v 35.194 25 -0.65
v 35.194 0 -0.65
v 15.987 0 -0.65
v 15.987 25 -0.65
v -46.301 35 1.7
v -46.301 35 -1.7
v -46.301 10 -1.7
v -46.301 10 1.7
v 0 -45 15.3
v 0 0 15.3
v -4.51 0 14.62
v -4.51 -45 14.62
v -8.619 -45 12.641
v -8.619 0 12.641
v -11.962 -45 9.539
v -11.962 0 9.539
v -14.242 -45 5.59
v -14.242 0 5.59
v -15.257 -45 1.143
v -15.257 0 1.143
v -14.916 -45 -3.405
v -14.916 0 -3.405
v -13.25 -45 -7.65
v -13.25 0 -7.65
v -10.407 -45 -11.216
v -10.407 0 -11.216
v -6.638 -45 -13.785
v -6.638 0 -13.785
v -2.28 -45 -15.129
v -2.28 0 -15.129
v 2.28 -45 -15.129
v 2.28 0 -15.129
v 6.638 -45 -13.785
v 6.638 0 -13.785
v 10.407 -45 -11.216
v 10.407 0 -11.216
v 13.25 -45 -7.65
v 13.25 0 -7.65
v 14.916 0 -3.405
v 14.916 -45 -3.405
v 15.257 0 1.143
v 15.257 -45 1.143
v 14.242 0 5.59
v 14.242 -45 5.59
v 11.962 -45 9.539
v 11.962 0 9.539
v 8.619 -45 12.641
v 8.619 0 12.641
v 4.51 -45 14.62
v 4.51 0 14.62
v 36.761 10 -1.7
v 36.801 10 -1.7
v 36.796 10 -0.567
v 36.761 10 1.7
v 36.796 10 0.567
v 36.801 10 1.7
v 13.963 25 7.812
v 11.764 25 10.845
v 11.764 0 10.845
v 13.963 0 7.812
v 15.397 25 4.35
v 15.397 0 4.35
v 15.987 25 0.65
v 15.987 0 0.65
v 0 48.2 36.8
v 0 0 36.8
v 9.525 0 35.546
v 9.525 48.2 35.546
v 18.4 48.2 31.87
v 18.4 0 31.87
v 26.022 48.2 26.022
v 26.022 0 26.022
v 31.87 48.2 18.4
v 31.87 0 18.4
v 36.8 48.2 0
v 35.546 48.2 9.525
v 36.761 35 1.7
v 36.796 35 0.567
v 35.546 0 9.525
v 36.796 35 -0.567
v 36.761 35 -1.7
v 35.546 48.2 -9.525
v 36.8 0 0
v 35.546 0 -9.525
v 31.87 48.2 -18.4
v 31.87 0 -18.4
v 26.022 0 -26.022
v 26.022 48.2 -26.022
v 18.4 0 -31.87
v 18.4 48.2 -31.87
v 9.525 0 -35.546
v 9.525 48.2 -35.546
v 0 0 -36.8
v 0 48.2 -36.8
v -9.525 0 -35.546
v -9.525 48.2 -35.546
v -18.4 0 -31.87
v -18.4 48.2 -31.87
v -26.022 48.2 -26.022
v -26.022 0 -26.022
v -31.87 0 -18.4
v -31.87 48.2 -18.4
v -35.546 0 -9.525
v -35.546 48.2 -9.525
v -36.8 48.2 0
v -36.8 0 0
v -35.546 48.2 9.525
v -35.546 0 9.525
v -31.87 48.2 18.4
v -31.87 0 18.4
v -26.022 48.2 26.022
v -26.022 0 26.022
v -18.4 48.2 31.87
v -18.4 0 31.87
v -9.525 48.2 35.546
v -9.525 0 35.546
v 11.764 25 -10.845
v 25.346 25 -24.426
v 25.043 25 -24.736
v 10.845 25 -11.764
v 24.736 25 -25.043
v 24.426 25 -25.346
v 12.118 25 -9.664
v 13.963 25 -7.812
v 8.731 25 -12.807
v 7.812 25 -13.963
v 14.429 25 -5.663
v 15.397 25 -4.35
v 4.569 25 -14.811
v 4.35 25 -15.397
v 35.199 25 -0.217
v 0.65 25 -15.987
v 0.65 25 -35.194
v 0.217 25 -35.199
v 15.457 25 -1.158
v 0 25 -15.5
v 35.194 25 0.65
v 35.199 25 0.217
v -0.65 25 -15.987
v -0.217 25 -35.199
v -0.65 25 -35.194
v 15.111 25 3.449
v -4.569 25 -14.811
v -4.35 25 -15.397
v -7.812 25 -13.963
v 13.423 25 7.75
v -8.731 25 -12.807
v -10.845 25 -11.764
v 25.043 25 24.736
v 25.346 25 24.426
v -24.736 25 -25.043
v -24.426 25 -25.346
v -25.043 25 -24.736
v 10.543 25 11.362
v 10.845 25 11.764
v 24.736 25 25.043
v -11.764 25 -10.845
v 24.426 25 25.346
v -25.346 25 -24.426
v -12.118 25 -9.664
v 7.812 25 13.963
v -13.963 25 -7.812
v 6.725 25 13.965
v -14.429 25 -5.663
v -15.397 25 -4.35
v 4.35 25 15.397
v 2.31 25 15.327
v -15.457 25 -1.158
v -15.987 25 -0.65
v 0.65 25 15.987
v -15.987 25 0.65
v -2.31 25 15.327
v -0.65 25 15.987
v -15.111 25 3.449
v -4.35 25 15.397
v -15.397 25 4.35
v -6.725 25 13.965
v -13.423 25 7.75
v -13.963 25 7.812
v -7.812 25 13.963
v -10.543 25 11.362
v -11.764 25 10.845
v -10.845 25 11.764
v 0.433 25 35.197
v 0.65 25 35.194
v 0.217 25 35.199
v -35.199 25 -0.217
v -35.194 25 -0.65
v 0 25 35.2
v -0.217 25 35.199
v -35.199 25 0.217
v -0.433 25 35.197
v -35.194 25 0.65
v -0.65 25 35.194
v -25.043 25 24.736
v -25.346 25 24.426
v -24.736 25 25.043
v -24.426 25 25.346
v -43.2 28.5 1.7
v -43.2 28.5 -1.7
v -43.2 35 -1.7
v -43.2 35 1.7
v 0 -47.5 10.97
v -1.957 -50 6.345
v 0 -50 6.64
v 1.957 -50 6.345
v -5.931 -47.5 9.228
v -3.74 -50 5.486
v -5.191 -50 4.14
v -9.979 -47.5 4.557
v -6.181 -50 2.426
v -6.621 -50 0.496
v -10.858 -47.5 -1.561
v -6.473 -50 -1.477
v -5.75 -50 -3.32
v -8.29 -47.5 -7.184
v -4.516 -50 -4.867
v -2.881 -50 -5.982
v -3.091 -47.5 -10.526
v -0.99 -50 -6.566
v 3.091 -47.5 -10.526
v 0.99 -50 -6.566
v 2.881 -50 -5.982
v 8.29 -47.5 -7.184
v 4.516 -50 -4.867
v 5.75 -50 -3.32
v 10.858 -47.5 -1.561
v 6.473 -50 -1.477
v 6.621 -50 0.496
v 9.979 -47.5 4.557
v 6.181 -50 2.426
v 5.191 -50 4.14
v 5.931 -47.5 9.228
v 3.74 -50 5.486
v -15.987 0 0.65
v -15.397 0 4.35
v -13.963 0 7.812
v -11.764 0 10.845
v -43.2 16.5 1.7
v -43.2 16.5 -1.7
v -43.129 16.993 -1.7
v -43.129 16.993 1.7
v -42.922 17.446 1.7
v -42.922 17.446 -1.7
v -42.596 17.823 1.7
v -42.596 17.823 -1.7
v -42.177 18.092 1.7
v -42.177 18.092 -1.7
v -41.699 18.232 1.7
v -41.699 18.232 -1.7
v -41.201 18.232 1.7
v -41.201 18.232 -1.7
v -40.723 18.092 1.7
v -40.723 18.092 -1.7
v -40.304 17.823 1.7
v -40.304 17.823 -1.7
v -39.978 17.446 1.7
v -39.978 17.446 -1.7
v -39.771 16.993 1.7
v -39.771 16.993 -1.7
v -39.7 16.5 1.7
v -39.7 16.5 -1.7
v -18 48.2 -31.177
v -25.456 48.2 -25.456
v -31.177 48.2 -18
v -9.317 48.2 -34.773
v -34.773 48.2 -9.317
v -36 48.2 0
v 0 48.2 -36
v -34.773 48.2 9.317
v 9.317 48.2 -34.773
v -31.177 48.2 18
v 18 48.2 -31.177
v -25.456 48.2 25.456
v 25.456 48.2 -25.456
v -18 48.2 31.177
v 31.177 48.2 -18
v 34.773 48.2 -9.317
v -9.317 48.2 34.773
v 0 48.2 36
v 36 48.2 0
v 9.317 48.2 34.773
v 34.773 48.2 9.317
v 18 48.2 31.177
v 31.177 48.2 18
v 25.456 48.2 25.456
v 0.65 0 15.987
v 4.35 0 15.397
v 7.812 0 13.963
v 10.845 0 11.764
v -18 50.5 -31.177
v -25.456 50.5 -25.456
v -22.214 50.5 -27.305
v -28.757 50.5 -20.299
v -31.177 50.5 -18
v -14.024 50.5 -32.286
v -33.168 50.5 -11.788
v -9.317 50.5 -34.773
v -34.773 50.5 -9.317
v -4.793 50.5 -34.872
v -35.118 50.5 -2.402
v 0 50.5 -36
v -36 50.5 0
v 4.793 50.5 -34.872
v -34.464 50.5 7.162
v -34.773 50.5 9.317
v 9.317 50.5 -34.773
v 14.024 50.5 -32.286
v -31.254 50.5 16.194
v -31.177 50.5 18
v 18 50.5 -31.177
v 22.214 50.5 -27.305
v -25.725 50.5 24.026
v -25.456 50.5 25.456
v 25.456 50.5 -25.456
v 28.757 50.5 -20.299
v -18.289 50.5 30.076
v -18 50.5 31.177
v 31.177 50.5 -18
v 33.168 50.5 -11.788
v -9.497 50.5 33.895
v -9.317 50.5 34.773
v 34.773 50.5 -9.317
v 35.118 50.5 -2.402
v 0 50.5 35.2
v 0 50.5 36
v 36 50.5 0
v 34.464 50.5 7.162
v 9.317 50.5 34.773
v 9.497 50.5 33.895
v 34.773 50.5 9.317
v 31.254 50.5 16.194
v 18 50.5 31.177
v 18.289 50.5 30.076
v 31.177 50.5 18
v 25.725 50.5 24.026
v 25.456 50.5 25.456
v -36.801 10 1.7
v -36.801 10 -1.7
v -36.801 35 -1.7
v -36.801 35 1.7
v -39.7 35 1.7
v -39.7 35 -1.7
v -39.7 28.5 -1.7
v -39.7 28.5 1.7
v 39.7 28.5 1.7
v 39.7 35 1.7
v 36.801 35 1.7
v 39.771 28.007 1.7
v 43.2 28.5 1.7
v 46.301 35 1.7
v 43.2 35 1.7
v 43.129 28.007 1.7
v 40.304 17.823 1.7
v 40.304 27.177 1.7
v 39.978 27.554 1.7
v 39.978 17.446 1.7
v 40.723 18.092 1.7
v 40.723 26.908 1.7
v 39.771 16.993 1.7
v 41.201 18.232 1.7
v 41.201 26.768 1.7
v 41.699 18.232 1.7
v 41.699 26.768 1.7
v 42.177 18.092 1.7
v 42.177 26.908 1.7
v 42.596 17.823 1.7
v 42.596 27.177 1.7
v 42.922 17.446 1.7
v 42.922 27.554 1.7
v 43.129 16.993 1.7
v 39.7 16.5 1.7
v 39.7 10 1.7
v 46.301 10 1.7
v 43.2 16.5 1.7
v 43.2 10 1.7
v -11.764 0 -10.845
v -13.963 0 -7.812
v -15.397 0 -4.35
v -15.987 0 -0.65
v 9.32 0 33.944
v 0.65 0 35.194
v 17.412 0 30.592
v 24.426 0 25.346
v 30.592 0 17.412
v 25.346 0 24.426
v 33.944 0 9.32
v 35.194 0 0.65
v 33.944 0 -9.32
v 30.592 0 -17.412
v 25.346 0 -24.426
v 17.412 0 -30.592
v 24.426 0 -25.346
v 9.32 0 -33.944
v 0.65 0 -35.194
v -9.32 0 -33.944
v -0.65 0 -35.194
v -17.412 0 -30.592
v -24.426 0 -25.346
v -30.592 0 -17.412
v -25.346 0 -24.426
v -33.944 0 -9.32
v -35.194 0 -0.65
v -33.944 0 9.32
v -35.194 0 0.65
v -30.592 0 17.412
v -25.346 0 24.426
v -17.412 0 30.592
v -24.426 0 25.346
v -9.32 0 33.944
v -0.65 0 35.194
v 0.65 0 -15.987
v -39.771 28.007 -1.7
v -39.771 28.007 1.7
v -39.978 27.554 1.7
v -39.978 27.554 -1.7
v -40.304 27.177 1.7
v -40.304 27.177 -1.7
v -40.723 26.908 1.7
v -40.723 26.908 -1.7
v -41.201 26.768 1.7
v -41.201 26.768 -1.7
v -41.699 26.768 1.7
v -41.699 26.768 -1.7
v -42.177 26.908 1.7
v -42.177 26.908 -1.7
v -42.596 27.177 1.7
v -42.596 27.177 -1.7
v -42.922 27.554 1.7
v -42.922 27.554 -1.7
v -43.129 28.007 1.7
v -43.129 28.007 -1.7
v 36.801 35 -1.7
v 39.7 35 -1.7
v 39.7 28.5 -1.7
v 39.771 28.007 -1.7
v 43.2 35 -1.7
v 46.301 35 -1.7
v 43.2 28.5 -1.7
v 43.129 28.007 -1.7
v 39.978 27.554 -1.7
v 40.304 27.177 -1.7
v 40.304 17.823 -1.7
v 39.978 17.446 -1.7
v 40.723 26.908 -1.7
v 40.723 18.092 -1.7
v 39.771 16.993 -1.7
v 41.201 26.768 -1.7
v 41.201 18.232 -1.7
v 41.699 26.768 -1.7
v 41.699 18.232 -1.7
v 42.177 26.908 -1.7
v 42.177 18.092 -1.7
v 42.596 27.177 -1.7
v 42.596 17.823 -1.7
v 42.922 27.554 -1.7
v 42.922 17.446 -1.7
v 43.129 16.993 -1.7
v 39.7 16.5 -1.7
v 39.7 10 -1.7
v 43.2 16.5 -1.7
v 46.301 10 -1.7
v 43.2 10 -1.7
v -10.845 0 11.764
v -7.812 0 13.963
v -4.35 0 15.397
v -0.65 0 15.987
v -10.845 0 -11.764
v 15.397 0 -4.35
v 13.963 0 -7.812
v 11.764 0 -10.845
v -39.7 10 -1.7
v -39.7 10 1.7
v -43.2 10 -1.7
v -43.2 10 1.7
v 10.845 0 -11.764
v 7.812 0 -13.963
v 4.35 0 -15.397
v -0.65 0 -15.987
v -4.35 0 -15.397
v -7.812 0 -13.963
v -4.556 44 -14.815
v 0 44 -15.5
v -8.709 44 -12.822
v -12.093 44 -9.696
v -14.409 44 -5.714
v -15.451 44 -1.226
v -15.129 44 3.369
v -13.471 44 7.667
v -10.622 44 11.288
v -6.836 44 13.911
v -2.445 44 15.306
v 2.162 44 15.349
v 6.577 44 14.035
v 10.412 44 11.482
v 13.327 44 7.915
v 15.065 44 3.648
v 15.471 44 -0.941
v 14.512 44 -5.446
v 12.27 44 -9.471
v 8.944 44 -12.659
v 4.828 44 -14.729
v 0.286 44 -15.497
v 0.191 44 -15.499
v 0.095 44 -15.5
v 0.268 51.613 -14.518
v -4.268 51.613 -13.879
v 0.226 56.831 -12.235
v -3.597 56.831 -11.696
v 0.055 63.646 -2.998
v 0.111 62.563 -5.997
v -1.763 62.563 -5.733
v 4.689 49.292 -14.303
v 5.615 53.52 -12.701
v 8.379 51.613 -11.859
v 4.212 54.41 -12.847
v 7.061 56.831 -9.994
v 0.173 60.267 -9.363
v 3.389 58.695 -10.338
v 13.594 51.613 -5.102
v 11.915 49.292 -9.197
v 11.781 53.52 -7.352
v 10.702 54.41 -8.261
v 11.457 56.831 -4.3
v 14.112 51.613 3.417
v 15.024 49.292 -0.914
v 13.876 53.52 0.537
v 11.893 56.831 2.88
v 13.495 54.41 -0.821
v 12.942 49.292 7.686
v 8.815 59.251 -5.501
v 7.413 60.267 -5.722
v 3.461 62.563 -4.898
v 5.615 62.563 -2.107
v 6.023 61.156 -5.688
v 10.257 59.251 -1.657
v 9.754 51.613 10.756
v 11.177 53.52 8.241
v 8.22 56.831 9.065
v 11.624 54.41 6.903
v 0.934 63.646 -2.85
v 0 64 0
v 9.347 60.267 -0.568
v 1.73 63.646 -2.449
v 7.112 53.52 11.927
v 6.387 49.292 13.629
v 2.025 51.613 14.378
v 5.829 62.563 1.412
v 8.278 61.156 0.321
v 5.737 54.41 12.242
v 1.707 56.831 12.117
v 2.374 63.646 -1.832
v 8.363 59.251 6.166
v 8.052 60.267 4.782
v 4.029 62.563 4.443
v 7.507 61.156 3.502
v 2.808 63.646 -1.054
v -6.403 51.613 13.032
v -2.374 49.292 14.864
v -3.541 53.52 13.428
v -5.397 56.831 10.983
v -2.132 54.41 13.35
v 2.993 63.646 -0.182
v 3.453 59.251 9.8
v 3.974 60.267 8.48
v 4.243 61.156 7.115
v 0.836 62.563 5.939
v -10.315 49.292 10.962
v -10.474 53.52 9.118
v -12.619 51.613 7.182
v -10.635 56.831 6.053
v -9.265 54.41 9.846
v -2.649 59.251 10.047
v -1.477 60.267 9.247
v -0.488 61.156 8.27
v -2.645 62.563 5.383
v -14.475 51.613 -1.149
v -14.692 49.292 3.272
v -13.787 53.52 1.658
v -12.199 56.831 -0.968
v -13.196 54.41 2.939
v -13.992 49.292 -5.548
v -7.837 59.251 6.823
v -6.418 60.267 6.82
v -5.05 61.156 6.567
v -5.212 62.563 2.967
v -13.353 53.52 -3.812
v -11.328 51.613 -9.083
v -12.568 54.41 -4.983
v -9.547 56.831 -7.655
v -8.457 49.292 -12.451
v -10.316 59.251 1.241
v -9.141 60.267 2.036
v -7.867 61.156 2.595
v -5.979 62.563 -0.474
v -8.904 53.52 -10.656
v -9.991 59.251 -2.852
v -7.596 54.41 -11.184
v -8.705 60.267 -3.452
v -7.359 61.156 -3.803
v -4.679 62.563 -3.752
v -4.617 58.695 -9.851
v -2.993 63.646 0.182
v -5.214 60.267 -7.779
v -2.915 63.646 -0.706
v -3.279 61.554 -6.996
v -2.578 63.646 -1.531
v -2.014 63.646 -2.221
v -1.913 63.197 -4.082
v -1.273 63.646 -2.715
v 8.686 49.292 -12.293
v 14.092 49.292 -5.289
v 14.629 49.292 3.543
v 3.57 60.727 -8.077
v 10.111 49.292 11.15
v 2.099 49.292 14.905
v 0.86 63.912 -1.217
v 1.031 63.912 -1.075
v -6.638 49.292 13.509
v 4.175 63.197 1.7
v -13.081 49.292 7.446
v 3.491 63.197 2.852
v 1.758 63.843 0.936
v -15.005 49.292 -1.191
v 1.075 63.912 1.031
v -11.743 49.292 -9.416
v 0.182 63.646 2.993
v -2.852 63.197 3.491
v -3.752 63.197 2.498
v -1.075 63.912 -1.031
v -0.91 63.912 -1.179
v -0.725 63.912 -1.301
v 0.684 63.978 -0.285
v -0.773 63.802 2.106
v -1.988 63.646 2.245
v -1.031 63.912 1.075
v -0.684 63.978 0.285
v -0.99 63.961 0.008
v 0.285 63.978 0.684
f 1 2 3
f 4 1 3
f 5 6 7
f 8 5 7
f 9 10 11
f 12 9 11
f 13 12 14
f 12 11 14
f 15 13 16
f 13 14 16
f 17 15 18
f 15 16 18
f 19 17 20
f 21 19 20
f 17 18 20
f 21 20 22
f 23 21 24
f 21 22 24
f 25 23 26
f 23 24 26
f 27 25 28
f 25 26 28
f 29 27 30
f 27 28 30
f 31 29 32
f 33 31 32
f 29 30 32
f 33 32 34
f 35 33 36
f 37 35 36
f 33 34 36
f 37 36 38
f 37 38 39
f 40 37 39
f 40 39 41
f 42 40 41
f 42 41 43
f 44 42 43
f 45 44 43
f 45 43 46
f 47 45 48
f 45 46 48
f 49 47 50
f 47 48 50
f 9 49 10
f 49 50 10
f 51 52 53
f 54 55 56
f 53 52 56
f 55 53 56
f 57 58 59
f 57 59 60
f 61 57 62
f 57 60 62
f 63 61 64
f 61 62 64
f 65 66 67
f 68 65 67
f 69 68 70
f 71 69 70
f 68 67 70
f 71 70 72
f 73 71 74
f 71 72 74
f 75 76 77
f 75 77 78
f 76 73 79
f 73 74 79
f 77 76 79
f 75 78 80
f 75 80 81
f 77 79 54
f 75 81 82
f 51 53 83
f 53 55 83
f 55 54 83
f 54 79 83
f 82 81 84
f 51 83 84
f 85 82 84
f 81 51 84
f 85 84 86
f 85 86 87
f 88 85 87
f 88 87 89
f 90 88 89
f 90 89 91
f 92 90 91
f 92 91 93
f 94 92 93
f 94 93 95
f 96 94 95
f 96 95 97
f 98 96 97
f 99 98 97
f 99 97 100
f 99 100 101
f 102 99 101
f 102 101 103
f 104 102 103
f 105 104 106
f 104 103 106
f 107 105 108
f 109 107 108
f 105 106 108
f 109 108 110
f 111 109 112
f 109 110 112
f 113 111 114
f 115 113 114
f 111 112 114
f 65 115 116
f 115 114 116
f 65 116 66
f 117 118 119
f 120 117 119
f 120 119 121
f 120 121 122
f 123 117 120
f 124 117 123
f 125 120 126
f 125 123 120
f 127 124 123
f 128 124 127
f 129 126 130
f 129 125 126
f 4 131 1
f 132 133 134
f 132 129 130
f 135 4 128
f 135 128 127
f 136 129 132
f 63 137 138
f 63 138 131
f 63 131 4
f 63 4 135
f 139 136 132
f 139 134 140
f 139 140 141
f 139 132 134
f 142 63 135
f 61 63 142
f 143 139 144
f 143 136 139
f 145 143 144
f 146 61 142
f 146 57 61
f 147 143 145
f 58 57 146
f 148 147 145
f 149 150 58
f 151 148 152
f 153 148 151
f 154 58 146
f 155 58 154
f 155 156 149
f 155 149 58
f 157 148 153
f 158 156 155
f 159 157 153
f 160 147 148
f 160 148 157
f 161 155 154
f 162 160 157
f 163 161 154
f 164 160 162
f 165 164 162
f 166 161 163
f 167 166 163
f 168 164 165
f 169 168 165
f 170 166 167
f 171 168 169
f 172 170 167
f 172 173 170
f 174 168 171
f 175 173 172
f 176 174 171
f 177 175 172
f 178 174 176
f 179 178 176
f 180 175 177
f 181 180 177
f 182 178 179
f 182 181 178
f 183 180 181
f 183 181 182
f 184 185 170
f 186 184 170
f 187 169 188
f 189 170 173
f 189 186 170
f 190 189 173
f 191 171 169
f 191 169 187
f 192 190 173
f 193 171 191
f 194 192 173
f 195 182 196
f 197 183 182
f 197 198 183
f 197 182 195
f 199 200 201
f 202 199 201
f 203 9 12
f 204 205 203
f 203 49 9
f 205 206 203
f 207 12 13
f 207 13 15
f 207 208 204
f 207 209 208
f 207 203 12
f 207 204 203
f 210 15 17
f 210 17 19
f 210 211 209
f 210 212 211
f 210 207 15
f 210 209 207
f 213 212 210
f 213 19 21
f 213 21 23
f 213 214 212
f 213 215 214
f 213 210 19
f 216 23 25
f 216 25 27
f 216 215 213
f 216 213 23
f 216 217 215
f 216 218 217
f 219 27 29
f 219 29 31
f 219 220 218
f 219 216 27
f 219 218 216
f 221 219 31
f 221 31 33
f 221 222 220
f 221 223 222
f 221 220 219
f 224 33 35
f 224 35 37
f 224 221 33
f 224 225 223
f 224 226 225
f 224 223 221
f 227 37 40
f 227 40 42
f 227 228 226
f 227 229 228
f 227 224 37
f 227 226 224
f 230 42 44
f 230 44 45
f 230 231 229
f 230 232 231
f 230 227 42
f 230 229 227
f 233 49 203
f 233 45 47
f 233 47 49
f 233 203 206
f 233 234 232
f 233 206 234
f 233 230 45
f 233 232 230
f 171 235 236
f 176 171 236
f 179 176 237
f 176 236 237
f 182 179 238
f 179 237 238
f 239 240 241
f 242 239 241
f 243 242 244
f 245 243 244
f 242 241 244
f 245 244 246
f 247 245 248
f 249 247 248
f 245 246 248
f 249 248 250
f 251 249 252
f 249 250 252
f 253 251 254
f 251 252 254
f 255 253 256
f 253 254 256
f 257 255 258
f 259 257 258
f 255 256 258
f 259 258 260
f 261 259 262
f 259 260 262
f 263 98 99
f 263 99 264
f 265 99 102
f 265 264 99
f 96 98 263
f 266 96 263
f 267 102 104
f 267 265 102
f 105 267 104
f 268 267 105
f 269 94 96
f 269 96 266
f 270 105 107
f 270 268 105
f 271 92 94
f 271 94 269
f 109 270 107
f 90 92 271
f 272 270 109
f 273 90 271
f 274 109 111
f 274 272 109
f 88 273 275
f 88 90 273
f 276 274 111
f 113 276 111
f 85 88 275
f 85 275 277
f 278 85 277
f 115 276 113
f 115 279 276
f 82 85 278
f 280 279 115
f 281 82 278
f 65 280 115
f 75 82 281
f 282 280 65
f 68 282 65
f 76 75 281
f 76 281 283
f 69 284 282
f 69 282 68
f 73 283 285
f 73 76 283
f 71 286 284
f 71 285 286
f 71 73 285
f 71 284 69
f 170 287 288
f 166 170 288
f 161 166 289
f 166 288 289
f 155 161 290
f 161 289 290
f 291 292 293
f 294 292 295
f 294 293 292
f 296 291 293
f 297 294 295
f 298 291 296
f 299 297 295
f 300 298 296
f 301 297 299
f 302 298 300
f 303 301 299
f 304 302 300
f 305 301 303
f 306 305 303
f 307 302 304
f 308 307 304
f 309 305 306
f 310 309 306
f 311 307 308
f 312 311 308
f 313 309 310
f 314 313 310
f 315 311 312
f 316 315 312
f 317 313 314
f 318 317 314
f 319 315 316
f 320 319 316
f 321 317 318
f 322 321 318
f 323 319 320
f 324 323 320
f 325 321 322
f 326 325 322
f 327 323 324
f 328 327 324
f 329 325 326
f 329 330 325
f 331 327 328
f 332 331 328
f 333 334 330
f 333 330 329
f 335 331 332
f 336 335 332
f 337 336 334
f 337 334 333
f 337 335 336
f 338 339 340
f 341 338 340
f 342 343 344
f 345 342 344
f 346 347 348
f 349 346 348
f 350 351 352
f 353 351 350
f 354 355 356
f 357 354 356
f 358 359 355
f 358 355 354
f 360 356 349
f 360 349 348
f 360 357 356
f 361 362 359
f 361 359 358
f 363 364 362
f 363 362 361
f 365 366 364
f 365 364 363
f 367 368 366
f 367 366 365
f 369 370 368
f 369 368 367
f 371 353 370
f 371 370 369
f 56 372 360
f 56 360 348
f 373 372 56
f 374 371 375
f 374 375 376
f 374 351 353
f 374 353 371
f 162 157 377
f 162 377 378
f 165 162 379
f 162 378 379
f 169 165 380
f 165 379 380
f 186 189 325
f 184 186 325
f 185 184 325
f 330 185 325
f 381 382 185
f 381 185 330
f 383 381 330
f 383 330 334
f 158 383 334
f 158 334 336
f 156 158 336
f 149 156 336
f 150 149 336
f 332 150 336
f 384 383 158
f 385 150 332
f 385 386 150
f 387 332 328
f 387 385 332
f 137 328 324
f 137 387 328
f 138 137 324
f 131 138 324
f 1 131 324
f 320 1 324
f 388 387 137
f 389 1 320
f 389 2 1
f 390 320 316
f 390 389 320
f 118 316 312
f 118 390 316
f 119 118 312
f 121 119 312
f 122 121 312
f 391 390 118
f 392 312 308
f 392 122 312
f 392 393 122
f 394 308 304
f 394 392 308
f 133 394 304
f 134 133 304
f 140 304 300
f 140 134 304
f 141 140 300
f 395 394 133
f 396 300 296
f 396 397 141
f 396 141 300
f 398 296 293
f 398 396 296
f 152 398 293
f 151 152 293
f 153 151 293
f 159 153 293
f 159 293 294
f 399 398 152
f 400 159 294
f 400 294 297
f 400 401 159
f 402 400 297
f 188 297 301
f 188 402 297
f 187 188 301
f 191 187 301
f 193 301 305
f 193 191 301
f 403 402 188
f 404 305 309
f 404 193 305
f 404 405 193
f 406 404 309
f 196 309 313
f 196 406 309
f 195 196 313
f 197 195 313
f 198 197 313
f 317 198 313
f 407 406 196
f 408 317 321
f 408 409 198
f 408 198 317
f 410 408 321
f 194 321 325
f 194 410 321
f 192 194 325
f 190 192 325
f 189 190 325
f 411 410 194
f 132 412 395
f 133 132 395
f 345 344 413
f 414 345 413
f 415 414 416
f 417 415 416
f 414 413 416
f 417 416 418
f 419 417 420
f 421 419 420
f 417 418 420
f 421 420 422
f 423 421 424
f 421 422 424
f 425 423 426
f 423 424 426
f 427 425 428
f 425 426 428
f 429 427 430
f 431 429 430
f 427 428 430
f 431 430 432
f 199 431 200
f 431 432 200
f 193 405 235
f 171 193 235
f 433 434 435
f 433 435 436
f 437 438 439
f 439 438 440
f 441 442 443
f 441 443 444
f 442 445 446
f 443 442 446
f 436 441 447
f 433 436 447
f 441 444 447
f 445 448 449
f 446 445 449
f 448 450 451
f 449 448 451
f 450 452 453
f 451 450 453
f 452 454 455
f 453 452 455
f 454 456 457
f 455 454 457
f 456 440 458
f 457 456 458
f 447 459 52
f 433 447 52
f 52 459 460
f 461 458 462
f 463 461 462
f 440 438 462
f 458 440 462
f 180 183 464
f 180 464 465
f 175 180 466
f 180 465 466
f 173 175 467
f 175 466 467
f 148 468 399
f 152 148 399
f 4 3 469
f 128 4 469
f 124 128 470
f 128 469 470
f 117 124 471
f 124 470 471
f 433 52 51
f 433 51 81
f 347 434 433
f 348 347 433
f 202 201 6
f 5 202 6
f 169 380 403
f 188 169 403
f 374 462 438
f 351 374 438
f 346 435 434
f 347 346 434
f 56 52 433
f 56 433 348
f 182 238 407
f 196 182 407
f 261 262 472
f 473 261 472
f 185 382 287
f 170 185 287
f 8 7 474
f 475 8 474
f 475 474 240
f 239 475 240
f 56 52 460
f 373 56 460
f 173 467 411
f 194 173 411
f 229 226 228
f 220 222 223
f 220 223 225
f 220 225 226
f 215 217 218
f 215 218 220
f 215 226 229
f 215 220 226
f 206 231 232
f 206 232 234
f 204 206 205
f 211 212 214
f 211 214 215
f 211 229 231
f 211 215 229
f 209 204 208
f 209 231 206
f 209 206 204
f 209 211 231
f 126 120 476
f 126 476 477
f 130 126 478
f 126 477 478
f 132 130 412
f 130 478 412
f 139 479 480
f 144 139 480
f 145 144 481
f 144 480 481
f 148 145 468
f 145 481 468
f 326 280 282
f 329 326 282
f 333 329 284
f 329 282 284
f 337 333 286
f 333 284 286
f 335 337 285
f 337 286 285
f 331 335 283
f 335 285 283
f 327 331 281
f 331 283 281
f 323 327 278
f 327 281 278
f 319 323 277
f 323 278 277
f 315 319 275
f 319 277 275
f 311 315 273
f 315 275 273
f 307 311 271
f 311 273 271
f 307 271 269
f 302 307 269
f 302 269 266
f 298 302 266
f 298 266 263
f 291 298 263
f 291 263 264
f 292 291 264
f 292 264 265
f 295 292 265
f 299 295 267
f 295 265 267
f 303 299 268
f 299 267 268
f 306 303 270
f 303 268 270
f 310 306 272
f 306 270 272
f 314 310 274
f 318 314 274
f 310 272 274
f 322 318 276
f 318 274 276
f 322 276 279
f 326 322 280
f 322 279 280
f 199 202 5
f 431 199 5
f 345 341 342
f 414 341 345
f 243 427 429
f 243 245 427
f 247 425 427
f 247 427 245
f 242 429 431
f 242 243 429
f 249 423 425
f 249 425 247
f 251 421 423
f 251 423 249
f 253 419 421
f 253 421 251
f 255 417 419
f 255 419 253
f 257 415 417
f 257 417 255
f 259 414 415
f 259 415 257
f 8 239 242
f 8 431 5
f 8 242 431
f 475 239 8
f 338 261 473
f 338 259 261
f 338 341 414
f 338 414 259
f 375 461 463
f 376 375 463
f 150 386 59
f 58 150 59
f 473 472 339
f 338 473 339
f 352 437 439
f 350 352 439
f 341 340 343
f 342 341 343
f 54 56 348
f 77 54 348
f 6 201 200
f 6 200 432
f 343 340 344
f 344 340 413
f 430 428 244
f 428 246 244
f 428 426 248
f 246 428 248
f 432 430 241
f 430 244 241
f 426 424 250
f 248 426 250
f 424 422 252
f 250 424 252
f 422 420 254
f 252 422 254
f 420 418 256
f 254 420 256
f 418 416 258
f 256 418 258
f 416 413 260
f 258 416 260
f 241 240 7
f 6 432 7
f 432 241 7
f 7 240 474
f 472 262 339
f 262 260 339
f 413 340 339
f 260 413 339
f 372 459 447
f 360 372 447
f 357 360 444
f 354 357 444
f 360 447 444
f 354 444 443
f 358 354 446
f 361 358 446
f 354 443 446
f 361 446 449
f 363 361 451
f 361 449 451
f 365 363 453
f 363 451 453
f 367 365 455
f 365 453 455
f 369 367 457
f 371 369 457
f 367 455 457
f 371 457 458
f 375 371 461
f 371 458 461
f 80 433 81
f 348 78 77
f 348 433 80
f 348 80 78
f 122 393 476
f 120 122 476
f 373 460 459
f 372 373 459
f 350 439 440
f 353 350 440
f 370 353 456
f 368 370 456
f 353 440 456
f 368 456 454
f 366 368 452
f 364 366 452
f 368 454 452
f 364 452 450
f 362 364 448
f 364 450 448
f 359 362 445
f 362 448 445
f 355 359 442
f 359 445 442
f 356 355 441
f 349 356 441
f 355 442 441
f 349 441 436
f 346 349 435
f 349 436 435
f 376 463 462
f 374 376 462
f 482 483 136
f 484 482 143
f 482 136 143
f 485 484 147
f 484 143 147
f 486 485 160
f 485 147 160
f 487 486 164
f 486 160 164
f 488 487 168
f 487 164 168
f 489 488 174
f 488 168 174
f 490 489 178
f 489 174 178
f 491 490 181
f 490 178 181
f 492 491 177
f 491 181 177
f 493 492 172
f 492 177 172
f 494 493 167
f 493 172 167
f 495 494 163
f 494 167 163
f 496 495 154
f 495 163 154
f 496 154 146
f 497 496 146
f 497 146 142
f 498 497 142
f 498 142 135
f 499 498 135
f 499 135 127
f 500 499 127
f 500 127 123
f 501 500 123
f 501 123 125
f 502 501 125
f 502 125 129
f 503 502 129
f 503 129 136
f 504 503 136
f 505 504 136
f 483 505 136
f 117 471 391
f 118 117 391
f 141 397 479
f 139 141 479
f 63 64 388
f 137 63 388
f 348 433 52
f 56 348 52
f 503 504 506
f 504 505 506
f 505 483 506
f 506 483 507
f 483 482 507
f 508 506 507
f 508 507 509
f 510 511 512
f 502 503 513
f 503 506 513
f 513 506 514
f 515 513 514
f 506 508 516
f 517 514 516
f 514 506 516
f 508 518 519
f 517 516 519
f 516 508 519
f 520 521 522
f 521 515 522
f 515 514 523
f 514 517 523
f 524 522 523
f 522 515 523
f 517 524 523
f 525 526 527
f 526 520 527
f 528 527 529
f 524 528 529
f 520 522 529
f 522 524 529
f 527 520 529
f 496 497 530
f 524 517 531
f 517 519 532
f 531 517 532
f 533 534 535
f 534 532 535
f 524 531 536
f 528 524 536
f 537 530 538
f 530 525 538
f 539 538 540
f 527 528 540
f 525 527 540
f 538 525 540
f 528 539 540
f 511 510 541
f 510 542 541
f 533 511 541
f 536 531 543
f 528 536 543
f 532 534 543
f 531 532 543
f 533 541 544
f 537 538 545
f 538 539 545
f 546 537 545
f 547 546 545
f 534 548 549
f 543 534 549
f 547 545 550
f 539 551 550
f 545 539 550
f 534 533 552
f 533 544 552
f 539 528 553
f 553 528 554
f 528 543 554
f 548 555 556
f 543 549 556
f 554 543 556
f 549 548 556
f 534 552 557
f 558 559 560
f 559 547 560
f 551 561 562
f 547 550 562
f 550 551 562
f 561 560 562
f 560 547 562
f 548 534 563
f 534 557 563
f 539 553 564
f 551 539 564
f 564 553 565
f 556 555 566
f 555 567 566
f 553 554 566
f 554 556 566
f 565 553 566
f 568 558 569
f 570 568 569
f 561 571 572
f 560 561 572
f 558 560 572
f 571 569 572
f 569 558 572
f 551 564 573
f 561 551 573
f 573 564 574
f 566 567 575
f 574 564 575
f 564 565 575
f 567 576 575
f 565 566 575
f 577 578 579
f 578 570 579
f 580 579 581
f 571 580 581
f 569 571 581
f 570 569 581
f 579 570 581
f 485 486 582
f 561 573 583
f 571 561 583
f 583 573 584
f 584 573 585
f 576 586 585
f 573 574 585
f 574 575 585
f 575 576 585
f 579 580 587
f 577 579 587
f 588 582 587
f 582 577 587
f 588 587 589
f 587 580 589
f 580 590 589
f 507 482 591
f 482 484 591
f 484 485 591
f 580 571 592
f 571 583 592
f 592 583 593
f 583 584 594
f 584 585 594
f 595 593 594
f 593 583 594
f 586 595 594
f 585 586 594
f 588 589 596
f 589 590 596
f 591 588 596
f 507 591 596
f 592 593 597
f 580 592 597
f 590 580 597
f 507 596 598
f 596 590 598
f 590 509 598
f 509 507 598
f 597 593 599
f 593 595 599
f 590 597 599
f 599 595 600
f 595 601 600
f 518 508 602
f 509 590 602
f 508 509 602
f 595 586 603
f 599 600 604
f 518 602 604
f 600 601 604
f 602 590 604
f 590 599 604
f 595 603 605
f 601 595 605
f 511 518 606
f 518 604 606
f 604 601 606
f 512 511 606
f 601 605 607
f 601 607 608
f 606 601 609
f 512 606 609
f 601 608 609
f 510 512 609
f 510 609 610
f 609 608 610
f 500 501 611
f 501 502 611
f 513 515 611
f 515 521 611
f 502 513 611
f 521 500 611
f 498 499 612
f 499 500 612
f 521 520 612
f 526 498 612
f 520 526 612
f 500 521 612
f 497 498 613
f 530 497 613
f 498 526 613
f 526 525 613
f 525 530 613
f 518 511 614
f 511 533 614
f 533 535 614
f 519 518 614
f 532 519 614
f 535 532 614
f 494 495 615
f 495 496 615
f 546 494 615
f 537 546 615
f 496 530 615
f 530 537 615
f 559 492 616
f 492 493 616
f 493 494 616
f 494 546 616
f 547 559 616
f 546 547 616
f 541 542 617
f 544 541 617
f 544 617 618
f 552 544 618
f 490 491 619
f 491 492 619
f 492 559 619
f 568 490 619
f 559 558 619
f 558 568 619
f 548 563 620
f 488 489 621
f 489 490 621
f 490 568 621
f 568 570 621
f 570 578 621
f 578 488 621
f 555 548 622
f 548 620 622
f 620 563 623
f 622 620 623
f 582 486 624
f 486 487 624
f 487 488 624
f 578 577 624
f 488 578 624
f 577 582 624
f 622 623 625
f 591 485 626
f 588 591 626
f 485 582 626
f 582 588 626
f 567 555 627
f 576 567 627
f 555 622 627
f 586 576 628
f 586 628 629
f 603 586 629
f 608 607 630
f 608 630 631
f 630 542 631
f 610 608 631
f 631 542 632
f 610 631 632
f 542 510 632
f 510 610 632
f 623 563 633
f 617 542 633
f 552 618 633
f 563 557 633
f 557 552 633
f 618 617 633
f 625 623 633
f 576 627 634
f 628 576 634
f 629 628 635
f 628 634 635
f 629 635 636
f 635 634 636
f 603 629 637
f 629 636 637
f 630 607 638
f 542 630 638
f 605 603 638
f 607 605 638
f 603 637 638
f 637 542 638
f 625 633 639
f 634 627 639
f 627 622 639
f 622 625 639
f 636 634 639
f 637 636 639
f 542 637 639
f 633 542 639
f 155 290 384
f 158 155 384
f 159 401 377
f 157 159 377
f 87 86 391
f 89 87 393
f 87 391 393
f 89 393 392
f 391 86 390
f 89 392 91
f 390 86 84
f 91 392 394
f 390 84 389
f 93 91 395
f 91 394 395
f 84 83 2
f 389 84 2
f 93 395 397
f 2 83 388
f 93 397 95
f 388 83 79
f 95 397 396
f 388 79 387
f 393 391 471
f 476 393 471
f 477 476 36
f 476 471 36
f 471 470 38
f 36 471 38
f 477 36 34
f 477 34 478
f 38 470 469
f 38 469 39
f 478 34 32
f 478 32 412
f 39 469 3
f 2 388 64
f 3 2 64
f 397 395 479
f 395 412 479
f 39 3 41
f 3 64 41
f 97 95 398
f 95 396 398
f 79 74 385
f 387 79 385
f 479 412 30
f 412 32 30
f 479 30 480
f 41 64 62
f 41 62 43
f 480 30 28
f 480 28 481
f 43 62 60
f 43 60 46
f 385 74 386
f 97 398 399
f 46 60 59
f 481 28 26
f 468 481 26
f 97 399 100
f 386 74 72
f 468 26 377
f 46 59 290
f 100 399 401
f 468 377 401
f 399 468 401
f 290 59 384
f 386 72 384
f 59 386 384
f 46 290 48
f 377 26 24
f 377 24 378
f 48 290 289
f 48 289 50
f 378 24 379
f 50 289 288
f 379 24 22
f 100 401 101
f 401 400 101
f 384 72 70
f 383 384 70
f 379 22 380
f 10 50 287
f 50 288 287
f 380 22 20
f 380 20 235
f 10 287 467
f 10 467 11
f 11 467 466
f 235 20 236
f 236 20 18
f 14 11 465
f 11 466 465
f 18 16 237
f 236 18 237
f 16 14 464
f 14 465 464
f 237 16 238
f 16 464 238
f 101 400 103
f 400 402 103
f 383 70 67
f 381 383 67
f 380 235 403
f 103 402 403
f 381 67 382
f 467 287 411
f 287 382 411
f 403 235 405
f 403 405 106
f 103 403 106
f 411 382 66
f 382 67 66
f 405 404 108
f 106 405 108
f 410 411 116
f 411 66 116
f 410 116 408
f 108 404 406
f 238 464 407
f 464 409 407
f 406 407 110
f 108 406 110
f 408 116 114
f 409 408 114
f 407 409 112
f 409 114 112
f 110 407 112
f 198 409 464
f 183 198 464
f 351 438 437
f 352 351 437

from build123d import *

# Parameters (mm, degrees)
SKETCH1_R                  = 36.8
SKETCH1_R_2                = 35.2
BOSS_EXTRUDE1_DEPTH        = 50.5
SKETCH2_R                  = 15
BOSS_EXTRUDE2_DEPTH        = 25
BOSS_EXTRUDE3_DEPTH        = 1.7
BOSS_EXTRUDE3_DEPTH_BACK   = 1.7
BOSS_EXTRUDE3_2_DEPTH      = 1.7
BOSS_EXTRUDE3_2_DEPTH_BACK = 1.7
BOSS_EXTRUDE4_REACH        = 105.973
BOSS_EXTRUDE4_END_RADIUS   = 36.8
SKETCH4_W                  = 3.4
SKETCH4_H                  = 25
CUT_EXTRUDE1_START         = -2.3
SKETCH5_R                  = 36.8
SKETCH5_R_2                = 36
CUT_EXTRUDE1_DEPTH         = 2.3
SKETCH6_R                  = 15.3
BOSS_EXTRUDE5_DEPTH        = 50
CHAMFER1_SIZE              = 5
CHAMFER1_SIZE2             = 8.660254038
SKETCH7_R                  = 15.5
BOSS_EXTRUDE6_DEPTH        = 44


with BuildPart() as part:
    # Sketch1 → Boss-Extrude1 (new body)
    with BuildSketch(Plane(origin=(0, 0, 0), x_dir=(1, 0, 0), z_dir=(0, 1, 0))):
        with Locations(Location((0, 0, 0), (0, 0, 270))):
            Circle(SKETCH1_R)
        with Locations(Location((0, 0, 0), (0, 0, 270))):
            Circle(SKETCH1_R_2, mode=Mode.SUBTRACT)
    extrude(amount=BOSS_EXTRUDE1_DEPTH)

    # Sketch2 → Boss-Extrude2 (add)
    with BuildSketch(Plane.XZ):
        with BuildLine():
            Line((15.986791423, 0.65), (35.193998068, 0.65))
            ThreePointArc((35.193998068, 0.65), (35.2, 0), (35.193998068, -0.65))
            Line((35.193998068, -0.65), (15.986791423, -0.65))
            ThreePointArc((15.986791423, -0.65), (14.78207252, -6.122934918), (11.763988032, -10.844749217))
            Line((11.763988032, -10.844749217), (25.345534099, -24.426295283))
            ThreePointArc((25.345534099, -24.426295283), (24.890158698, -24.890158698), (24.426295283, -25.345534099))
            Line((24.426295283, -25.345534099), (10.844749217, -11.763988032))
            ThreePointArc((10.844749217, -11.763988032), (6.122934918, -14.78207252), (0.65, -15.986791423))
            Line((0.65, -15.986791423), (0.65, -35.193998068))
            ThreePointArc((0.65, -35.193998068), (0, -35.2), (-0.65, -35.193998068))
            Line((-0.65, -35.193998068), (-0.65, -15.986791423))
            ThreePointArc((-0.65, -15.986791423), (-6.122934918, -14.78207252), (-10.844749217, -11.763988032))
            Line((-10.844749217, -11.763988032), (-24.426295283, -25.345534099))
            ThreePointArc((-24.426295283, -25.345534099), (-24.890158698, -24.890158698), (-25.345534099, -24.426295283))
            Line((-25.345534099, -24.426295283), (-11.763988032, -10.844749217))
            ThreePointArc((-11.763988032, -10.844749217), (-14.78207252, -6.122934918), (-15.986791423, -0.65))
            Line((-15.986791423, -0.65), (-35.193998068, -0.65))
            ThreePointArc((-35.193998068, -0.65), (-35.2, 0), (-35.193998068, 0.65))
            Line((-35.193998068, 0.65), (-15.986791423, 0.65))
            ThreePointArc((-15.986791423, 0.65), (-14.78207252, 6.122934918), (-11.763988032, 10.844749217))
            Line((-11.763988032, 10.844749217), (-25.345534099, 24.426295283))
            ThreePointArc((-25.345534099, 24.426295283), (-24.890158698, 24.890158698), (-24.426295283, 25.345534099))
            Line((-24.426295283, 25.345534099), (-10.844749217, 11.763988032))
            ThreePointArc((-10.844749217, 11.763988032), (-6.122934918, 14.78207252), (-0.65, 15.986791423))
            Line((-0.65, 15.986791423), (-0.65, 35.193998068))
            ThreePointArc((-0.65, 35.193998068), (0, 35.2), (0.65, 35.193998068))
            Line((0.65, 35.193998068), (0.65, 15.986791423))
            ThreePointArc((0.65, 15.986791423), (6.122934918, 14.78207252), (10.844749217, 11.763988032))
            Line((10.844749217, 11.763988032), (24.426295283, 25.345534099))
            ThreePointArc((24.426295283, 25.345534099), (24.890158698, 24.890158698), (25.345534099, 24.426295283))
            Line((25.345534099, 24.426295283), (11.763988032, 10.844749217))
            ThreePointArc((11.763988032, 10.844749217), (14.78207252, 6.122934918), (15.986791423, 0.65))
        make_face()
        with Locations(Location((0, 0, 0), (0, 0, 270))):
            Circle(SKETCH2_R, mode=Mode.SUBTRACT)
    extrude(amount=-BOSS_EXTRUDE2_DEPTH)

    # Boss-Extrude4: up to this cylinder (the profile starts outside it)
    boss_extrude4_end = Plane(origin=(0, 22.5, 0), z_dir=(0, -1, 0)) * Cylinder(BOSS_EXTRUDE4_END_RADIUS, 286.546, mode=Mode.PRIVATE)
    # Sketch4 → Boss-Extrude4 (add, up to the surface)
    with BuildSketch(Plane.ZY.offset(-36.800796618), mode=Mode.PRIVATE) as boss_extrude4_sk1:
        with Locations((0, 22.5)):
            Rectangle(SKETCH4_W, SKETCH4_H)
    boss_extrude4_tool1 = extrude(boss_extrude4_sk1.sketch, amount=BOSS_EXTRUDE4_REACH, mode=Mode.PRIVATE) - boss_extrude4_end
    add(boss_extrude4_tool1.solids().sort_by_distance((36.800797, 22.5, 0))[0])

    # Sketch5 → Cut-Extrude1 (cut)
    with BuildSketch(Plane(origin=(0, 50.5, 0), x_dir=(1, 0, 0), z_dir=(0, 1, 0)).offset(CUT_EXTRUDE1_START)):
        with Locations(Location((0, 0, 0), (0, 0, 270))):
            Circle(SKETCH5_R)
        with Locations(Location((0, 0, 0), (0, 0, 270))):
            Circle(SKETCH5_R_2, mode=Mode.SUBTRACT)
    extrude(amount=CUT_EXTRUDE1_DEPTH, mode=Mode.SUBTRACT)

    # Sketch6 → Boss-Extrude5 (add)
    with BuildSketch(Plane.XZ):
        with Locations(Location((0, 0, 0), (0, 0, 90))):
            Circle(SKETCH6_R)
    extrude(amount=BOSS_EXTRUDE5_DEPTH)

    # Chamfer1
    chamfer1_edges = [part.edges().sort_by_distance(p)[0] for p in [
        (0, -50, -15.3),
    ]]
    chamfer1_side = [part.faces().sort_by_distance(p)[0] for p in [
        (0, -25, -15.3),
    ]]
    chamfer(chamfer1_edges, length=CHAMFER1_SIZE, length2=CHAMFER1_SIZE2, reference=chamfer1_side[0])

    # Sketch7 → Boss-Extrude6 (add)
    with BuildSketch(Plane(origin=(0, 0, 0), x_dir=(1, 0, 0), z_dir=(0, 1, 0))):
        with Locations(Location((0, 0, 0), (0, 0, 90))):
            Circle(SKETCH7_R)
    extrude(amount=BOSS_EXTRUDE6_DEPTH)

    # Sketch8 → Revolve2 (revolve)
    with BuildSketch(Plane(origin=(0, 0, 0), x_dir=(0, -1, 0), z_dir=(0, 0, 1)), mode=Mode.PRIVATE) as revolve2_sk:
        with BuildLine():
            Line((-44, 15.5), (-44, 0))
            Line((-44, 0), (-64, 0))
            add(Edge.make_bspline(
                [(-44, 15.5), (-57.970648209, 15.5), (-64, 7.069745011), (-64, 0)],
                knots=[0, 0, 0, 0, 1, 1, 1, 1], degree=3))
        make_face()
    revolve(revolve2_sk.sketch.rotate(Axis((0, 25, 0), (0, -1, 0)), 271.058078794), axis=Axis((0, 25, 0), (0, -1, 0)))


with BuildPart() as body_2:
    # Sketch3 → Boss-Extrude3 (new, two sides: drawn at the far end of the back side and taken through both)
    with BuildSketch(Plane(origin=(0, 0, 0), x_dir=(0, -1, 0), z_dir=(0, 0, 1)).offset(-BOSS_EXTRUDE3_DEPTH_BACK)):
        with BuildLine():
            Line((-35, 36.800796618), (-10, 36.800796618))
            Line((-10, 36.800796618), (-10, 39.7))
            Line((-10, 39.7), (-16.5, 39.7))
            ThreePointArc((-16.5, 39.7), (-18.25, 41.45), (-16.5, 43.2))
            Line((-16.5, 43.2), (-10, 43.2))
            Line((-10, 43.2), (-10, 46.300796618))
            Line((-10, 46.300796618), (-35, 46.300796618))
            Line((-35, 46.300796618), (-35, 43.2))
            Line((-35, 43.2), (-28.5, 43.2))
            ThreePointArc((-28.5, 43.2), (-26.75, 41.45), (-28.5, 39.7))
            Line((-28.5, 39.7), (-35, 39.7))
            Line((-35, 39.7), (-35, 36.800796618))
        make_face()
    extrude(amount=BOSS_EXTRUDE3_DEPTH + BOSS_EXTRUDE3_DEPTH_BACK)


with BuildPart() as body_3:
    # Sketch3 → Boss-Extrude3 2 (new, two sides: drawn at the far end of the back side and taken through both)
    with BuildSketch(Plane(origin=(0, 0, 0), x_dir=(0, -1, 0), z_dir=(0, 0, 1)).offset(-BOSS_EXTRUDE3_2_DEPTH_BACK)):
        with BuildLine():
            Line((-16.5, -39.7), (-10, -39.7))
            Line((-10, -39.7), (-10, -36.800796618))
            Line((-10, -36.800796618), (-35, -36.800796618))
            Line((-35, -36.800796618), (-35, -39.7))
            Line((-35, -39.7), (-28.5, -39.7))
            ThreePointArc((-28.5, -39.7), (-26.75, -41.45), (-28.5, -43.2))
            Line((-28.5, -43.2), (-35, -43.2))
            Line((-35, -43.2), (-35, -46.300796618))
            Line((-35, -46.300796618), (-10, -46.300796618))
            Line((-10, -46.300796618), (-10, -43.2))
            Line((-10, -43.2), (-16.5, -43.2))
            ThreePointArc((-16.5, -43.2), (-18.25, -41.45), (-16.5, -39.7))
        make_face()
    extrude(amount=BOSS_EXTRUDE3_2_DEPTH + BOSS_EXTRUDE3_2_DEPTH_BACK)


solid = Compound([part.part, body_2.part, body_3.part])
